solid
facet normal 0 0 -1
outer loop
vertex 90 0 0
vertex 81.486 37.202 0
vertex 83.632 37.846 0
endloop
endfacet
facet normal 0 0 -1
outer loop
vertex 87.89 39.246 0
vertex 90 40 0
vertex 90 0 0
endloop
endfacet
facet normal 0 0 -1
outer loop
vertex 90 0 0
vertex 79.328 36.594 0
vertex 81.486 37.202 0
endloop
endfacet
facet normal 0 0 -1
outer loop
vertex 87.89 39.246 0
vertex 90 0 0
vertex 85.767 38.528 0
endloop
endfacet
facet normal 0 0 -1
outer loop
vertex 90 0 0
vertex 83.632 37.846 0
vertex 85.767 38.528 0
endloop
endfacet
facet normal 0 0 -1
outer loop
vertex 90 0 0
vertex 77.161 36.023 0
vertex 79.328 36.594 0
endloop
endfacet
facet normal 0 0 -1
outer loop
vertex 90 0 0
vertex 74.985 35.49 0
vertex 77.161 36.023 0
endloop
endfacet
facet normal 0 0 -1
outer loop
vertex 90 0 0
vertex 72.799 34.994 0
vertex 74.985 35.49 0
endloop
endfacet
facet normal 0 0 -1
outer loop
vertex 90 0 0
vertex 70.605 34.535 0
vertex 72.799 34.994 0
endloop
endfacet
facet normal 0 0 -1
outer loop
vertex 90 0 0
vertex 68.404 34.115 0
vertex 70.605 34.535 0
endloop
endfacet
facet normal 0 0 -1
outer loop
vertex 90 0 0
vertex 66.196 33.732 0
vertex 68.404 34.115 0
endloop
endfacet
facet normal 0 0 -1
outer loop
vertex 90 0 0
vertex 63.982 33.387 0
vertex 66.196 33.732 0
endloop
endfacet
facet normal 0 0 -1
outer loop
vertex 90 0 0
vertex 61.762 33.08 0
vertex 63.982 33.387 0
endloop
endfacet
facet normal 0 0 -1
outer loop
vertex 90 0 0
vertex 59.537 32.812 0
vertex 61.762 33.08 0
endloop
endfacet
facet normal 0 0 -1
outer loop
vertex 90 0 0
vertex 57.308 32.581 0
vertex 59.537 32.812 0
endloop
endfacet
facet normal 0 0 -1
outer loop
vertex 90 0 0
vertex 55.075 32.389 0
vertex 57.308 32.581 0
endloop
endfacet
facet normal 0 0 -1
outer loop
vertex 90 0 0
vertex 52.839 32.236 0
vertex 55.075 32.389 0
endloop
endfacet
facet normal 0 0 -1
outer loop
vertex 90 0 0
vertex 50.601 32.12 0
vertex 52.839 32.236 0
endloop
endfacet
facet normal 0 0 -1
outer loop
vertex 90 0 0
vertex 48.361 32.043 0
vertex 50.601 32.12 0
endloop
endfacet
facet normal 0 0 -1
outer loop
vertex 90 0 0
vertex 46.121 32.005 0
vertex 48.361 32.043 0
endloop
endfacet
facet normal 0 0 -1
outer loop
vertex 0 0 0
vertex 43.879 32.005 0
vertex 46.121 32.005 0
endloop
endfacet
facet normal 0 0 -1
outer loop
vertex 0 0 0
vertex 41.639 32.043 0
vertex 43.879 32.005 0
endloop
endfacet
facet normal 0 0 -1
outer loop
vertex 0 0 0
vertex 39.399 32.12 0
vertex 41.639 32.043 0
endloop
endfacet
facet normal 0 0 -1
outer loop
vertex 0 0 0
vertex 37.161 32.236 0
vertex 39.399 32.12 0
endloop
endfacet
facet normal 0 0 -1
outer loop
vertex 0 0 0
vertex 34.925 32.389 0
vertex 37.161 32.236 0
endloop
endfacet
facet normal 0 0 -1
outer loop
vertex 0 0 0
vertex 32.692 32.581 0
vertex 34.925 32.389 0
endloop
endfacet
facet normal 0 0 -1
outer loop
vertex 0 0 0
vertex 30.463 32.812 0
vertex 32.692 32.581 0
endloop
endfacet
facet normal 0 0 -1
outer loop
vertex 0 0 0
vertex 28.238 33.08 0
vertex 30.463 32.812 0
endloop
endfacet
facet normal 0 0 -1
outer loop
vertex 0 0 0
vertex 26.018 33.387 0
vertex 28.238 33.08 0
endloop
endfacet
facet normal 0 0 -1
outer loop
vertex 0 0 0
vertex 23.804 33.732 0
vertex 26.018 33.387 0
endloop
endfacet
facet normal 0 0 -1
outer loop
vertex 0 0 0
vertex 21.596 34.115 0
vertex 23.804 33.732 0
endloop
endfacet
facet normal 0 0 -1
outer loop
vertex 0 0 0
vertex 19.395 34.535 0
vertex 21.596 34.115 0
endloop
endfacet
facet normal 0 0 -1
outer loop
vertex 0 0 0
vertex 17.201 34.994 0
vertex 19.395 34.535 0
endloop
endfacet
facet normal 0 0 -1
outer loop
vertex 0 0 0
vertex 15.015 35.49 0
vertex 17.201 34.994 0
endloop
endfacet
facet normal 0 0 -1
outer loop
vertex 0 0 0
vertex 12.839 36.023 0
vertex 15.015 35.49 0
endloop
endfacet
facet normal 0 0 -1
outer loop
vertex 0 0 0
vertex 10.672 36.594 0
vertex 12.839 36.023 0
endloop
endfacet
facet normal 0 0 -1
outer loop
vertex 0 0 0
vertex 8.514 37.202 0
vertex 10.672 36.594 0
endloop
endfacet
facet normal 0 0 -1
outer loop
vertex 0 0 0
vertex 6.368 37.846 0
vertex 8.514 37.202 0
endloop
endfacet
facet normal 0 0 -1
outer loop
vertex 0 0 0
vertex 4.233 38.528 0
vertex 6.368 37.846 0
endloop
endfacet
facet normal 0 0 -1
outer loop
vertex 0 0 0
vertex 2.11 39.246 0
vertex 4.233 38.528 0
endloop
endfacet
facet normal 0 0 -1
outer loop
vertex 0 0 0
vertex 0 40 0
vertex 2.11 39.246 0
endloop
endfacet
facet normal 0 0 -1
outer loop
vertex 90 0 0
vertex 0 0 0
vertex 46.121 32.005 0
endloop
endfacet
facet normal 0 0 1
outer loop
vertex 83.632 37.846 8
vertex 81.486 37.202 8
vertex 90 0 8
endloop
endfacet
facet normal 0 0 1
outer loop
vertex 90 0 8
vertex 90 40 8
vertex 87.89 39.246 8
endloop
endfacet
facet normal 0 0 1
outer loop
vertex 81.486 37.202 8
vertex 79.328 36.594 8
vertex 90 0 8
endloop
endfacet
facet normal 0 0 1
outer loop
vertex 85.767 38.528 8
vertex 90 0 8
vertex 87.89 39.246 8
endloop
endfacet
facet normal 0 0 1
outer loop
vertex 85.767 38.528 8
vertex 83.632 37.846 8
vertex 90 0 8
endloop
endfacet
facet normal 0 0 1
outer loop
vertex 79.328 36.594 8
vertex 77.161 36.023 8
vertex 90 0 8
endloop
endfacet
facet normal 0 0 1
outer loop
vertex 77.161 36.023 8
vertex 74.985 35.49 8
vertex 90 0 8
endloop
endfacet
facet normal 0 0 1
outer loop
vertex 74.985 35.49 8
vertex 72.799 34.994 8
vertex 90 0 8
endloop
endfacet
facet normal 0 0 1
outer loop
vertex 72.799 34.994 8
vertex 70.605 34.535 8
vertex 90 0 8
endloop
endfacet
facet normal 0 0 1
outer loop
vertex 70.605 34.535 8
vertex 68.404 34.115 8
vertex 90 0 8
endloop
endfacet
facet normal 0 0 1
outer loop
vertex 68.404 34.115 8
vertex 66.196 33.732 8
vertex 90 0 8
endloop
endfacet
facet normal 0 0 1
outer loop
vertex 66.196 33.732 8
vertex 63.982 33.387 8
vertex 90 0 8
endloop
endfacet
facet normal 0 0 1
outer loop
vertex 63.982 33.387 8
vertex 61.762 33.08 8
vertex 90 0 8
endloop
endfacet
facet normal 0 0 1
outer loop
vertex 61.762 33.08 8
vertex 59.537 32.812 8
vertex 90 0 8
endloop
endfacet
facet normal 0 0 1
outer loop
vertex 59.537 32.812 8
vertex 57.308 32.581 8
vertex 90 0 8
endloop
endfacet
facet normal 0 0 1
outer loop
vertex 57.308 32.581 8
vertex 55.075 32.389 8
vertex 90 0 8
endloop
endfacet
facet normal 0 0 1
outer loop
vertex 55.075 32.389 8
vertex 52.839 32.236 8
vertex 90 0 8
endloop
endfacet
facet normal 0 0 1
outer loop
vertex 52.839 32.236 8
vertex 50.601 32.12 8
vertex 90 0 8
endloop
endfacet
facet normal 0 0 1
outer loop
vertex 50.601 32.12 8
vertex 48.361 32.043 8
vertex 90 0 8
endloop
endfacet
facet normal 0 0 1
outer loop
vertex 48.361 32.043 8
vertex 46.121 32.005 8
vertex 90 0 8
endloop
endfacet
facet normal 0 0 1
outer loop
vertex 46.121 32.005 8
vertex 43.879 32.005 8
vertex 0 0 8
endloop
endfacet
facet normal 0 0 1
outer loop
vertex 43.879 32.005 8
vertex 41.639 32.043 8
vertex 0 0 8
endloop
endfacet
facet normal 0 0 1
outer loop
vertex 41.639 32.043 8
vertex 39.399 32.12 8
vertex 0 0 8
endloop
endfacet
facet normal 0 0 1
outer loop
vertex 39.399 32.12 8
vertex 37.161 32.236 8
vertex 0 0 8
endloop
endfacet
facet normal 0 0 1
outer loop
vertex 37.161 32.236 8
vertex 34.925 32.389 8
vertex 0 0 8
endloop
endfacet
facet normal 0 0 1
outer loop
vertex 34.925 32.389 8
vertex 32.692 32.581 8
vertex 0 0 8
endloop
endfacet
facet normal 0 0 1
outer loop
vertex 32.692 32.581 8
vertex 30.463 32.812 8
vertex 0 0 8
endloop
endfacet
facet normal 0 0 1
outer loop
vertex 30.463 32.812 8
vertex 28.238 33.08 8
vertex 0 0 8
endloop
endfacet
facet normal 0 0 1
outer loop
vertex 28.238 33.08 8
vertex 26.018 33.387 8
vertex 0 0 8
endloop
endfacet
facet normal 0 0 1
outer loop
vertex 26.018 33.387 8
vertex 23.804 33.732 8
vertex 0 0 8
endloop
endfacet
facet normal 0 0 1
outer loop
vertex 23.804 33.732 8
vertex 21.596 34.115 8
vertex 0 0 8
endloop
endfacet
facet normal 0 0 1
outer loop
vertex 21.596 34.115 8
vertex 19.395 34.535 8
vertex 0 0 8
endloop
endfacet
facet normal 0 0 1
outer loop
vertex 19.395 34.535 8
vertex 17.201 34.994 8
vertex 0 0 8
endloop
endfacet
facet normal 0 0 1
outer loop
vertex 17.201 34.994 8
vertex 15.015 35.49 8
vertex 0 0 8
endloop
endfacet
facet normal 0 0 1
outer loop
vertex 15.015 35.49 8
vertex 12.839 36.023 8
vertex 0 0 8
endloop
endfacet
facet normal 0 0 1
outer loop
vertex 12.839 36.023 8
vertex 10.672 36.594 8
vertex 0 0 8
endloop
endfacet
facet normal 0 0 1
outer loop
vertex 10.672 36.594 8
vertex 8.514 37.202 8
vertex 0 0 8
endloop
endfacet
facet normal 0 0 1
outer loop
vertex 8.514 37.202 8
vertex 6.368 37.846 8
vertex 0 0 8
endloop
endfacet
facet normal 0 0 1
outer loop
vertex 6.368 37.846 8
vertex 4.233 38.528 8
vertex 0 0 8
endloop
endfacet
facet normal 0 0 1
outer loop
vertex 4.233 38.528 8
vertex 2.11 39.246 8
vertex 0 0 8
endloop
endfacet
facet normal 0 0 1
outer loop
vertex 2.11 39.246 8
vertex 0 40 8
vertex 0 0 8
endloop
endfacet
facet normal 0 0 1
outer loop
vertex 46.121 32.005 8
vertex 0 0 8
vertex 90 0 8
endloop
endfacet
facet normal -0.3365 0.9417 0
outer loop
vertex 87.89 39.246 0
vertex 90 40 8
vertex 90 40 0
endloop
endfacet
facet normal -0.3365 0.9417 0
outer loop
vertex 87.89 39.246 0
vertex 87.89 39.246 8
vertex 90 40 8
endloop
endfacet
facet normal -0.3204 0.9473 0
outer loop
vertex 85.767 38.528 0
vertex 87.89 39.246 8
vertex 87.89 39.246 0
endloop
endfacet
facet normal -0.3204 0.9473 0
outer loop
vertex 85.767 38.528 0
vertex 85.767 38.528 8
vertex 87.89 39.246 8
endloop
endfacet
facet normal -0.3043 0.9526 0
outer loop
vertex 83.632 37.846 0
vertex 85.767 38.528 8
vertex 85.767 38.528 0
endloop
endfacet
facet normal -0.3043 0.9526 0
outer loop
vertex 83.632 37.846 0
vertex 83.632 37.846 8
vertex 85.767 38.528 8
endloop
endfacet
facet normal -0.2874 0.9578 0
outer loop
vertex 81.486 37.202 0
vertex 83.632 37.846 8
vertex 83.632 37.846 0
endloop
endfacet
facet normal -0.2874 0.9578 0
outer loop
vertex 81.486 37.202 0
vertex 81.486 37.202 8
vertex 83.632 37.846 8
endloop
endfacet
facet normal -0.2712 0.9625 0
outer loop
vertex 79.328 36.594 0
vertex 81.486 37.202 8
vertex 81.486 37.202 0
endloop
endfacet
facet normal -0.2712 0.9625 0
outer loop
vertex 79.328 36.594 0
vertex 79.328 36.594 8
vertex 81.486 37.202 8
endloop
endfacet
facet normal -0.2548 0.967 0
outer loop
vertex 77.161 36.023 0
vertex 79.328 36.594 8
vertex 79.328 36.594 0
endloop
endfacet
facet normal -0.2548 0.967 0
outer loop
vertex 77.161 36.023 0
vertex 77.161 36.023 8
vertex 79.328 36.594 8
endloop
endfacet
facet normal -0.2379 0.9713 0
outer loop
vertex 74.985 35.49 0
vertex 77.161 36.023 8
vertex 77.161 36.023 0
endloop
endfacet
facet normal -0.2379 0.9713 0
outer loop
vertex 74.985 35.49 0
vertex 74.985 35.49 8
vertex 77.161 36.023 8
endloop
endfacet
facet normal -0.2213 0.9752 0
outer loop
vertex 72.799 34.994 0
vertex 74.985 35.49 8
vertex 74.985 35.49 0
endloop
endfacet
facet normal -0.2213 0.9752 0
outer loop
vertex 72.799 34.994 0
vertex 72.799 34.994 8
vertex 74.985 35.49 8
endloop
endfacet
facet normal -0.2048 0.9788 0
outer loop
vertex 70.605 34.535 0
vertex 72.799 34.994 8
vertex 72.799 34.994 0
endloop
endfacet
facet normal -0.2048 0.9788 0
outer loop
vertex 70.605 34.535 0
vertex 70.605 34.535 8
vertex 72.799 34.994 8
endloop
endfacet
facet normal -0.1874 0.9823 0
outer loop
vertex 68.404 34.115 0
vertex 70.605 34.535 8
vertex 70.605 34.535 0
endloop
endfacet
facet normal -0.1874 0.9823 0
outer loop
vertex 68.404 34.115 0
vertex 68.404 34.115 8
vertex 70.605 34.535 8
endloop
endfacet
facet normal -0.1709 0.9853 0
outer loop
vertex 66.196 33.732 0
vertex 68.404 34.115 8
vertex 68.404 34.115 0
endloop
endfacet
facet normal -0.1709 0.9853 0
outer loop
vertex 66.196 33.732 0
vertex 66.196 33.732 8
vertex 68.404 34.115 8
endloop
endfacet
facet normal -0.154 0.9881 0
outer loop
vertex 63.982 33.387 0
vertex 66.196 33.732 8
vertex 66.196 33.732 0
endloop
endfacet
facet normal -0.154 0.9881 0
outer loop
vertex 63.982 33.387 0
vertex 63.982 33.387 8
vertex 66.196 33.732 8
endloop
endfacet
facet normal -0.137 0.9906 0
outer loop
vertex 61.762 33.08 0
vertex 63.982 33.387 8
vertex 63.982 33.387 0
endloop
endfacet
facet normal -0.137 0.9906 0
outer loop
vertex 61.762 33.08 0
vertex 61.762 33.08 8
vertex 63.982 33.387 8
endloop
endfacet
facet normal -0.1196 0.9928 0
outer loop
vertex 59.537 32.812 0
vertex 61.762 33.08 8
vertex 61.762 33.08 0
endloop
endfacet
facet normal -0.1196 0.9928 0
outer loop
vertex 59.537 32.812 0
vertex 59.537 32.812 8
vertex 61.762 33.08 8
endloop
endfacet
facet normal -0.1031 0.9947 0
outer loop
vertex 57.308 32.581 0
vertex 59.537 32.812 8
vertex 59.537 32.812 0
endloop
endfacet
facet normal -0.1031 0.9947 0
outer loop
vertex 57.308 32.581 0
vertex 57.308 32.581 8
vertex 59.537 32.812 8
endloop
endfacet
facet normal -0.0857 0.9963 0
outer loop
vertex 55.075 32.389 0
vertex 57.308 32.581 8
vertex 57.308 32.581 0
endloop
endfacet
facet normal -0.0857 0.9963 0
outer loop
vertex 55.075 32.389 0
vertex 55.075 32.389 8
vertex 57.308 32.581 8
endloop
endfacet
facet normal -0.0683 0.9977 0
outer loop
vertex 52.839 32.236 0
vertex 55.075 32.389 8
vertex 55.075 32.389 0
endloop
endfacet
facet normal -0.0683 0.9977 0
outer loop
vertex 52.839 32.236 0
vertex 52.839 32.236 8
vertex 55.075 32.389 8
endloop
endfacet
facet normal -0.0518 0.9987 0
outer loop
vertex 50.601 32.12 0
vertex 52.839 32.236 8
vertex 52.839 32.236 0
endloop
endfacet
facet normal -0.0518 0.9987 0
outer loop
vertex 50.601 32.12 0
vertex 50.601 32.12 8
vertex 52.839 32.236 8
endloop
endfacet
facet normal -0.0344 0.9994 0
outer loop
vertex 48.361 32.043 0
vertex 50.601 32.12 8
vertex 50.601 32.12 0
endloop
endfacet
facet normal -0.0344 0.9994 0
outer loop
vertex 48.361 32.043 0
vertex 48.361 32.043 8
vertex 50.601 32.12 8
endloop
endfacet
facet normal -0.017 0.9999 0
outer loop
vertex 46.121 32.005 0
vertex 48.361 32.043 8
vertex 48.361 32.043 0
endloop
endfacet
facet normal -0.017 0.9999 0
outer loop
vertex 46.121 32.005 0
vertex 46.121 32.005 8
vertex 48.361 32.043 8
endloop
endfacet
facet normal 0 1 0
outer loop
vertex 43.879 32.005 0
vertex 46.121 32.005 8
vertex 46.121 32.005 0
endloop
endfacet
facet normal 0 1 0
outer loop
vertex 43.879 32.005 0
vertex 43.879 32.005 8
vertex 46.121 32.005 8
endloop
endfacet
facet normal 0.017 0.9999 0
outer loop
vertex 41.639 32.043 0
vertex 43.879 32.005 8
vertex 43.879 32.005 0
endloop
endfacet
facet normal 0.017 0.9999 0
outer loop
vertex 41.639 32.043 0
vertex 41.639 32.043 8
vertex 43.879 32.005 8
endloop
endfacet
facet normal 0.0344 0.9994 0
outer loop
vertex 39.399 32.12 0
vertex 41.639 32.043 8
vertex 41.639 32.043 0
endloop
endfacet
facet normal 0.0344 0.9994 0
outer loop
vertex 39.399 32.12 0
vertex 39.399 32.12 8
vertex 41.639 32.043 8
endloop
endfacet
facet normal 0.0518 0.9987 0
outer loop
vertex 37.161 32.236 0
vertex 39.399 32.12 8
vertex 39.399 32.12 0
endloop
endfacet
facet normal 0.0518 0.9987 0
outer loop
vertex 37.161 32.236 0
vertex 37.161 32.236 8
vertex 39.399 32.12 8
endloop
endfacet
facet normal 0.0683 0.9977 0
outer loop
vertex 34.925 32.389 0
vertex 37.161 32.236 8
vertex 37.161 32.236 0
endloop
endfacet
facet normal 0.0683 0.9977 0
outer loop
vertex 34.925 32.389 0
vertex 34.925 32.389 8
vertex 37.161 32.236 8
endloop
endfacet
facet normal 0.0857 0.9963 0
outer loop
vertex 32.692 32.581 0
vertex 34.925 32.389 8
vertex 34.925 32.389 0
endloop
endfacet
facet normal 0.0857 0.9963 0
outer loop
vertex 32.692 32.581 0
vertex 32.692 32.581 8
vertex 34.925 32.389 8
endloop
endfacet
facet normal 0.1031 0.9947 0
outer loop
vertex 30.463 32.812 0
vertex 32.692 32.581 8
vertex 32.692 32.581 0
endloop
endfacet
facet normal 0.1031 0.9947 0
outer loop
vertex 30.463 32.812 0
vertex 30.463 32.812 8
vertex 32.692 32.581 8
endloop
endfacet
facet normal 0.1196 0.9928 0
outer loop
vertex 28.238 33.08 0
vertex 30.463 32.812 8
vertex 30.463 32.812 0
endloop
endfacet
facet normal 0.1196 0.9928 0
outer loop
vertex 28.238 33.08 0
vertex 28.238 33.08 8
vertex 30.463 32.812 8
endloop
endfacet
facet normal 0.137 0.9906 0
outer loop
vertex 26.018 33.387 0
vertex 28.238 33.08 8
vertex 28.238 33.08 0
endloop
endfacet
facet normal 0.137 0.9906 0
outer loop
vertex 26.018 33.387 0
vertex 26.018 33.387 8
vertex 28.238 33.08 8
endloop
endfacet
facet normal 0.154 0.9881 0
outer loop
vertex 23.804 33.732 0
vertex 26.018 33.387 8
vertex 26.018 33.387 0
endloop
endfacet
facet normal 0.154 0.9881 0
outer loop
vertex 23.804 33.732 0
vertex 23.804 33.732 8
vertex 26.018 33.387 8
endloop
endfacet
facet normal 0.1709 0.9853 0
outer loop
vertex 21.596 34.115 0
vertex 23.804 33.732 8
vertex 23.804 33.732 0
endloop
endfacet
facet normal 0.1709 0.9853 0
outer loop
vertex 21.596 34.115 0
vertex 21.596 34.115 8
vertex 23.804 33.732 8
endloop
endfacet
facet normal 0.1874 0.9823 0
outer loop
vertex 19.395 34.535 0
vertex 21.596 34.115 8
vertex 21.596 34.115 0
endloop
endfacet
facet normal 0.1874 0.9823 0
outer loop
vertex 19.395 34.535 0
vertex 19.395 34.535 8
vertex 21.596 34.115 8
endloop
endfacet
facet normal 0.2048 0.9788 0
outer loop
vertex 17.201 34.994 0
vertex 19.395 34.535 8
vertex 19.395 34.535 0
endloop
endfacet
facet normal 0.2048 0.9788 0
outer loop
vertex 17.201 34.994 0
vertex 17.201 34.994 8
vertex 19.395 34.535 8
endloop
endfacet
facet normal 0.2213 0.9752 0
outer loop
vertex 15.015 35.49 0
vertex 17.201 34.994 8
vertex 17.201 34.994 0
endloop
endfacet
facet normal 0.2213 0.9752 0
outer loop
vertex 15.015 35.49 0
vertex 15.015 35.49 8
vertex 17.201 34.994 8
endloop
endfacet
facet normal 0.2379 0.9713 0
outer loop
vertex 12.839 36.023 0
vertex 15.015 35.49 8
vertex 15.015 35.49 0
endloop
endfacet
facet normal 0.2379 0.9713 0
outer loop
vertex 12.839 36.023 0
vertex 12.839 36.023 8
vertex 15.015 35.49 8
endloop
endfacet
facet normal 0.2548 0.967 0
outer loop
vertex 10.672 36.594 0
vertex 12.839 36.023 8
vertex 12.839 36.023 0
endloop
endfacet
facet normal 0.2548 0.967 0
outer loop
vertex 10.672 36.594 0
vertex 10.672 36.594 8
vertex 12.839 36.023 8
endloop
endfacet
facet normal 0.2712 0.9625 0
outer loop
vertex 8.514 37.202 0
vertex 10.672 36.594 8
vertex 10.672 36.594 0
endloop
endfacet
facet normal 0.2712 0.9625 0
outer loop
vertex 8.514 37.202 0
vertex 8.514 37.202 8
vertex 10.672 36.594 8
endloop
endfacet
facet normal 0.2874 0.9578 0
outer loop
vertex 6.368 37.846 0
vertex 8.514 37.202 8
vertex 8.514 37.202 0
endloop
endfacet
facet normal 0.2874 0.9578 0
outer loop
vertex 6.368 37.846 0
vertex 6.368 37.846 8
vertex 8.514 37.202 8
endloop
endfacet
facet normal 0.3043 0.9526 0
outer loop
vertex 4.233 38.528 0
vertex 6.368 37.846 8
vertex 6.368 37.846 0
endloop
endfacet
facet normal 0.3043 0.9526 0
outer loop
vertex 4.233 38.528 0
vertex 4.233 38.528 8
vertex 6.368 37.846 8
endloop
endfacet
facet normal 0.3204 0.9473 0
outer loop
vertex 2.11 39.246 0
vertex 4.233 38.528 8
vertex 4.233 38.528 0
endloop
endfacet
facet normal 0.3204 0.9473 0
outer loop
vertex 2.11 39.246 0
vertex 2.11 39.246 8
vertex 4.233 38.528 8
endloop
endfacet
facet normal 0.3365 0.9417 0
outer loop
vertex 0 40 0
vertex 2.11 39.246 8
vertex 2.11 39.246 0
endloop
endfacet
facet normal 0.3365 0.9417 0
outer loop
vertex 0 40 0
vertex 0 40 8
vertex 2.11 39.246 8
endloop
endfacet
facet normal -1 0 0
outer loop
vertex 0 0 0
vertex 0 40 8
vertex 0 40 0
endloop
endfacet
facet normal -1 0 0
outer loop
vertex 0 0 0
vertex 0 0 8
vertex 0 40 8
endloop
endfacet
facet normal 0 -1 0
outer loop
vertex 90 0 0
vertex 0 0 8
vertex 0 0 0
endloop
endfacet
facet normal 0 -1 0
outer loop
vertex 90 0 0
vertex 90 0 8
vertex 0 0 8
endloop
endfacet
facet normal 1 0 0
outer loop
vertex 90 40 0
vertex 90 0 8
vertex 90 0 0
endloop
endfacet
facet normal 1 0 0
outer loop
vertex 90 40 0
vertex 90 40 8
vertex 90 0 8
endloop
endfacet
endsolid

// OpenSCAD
$fn = 32;

// ----------------------------------------------------------------------
// Arc profile plate: notch, 44 points
// ----------------------------------------------------------------------

// --- parameters (mm) ---
bar_l = 90;               // bar length, X
bar_w = 40;               // bar width, Y
notch_depth = 8;          // depth of the arc notch at mid-span
arc_r = 130.56;           // radius of the notch arc
arc_angle = 40.32;        // notch arc angle, degrees
arc_step = 1;             // sampling step of the notch arc, degrees
plate_t = 8;              // plate thickness, Z
fit_tol = 0.05;           // declared fit tolerance (prompt contract)
free_tol = 0.3;           // declared free tolerance (prompt contract)

profile = [[0, 0], [90, 0], [90, 40], [87.89, 39.246], [85.767, 38.528], [83.632, 37.846], [81.486, 37.202], [79.328, 36.594], [77.161, 36.023], [74.985, 35.49], [72.799, 34.994], [70.605, 34.535], [68.404, 34.115], [66.196, 33.732], [63.982, 33.387], [61.762, 33.08], [59.537, 32.812], [57.308, 32.581], [55.075, 32.389], [52.839, 32.236], [50.601, 32.12], [48.361, 32.043], [46.121, 32.005], [43.879, 32.005], [41.639, 32.043], [39.399, 32.12], [37.161, 32.236], [34.925, 32.389], [32.692, 32.581], [30.463, 32.812], [28.238, 33.08], [26.018, 33.387], [23.804, 33.732], [21.596, 34.115], [19.395, 34.535], [17.201, 34.994], [15.015, 35.49], [12.839, 36.023], [10.672, 36.594], [8.514, 37.202], [6.368, 37.846], [4.233, 38.528], [2.11, 39.246], [0, 40]];  // primary outline, 44 points, counter clockwise

// --- the one profile operation ---
linear_extrude(height = plate_t) polygon(points = profile);
